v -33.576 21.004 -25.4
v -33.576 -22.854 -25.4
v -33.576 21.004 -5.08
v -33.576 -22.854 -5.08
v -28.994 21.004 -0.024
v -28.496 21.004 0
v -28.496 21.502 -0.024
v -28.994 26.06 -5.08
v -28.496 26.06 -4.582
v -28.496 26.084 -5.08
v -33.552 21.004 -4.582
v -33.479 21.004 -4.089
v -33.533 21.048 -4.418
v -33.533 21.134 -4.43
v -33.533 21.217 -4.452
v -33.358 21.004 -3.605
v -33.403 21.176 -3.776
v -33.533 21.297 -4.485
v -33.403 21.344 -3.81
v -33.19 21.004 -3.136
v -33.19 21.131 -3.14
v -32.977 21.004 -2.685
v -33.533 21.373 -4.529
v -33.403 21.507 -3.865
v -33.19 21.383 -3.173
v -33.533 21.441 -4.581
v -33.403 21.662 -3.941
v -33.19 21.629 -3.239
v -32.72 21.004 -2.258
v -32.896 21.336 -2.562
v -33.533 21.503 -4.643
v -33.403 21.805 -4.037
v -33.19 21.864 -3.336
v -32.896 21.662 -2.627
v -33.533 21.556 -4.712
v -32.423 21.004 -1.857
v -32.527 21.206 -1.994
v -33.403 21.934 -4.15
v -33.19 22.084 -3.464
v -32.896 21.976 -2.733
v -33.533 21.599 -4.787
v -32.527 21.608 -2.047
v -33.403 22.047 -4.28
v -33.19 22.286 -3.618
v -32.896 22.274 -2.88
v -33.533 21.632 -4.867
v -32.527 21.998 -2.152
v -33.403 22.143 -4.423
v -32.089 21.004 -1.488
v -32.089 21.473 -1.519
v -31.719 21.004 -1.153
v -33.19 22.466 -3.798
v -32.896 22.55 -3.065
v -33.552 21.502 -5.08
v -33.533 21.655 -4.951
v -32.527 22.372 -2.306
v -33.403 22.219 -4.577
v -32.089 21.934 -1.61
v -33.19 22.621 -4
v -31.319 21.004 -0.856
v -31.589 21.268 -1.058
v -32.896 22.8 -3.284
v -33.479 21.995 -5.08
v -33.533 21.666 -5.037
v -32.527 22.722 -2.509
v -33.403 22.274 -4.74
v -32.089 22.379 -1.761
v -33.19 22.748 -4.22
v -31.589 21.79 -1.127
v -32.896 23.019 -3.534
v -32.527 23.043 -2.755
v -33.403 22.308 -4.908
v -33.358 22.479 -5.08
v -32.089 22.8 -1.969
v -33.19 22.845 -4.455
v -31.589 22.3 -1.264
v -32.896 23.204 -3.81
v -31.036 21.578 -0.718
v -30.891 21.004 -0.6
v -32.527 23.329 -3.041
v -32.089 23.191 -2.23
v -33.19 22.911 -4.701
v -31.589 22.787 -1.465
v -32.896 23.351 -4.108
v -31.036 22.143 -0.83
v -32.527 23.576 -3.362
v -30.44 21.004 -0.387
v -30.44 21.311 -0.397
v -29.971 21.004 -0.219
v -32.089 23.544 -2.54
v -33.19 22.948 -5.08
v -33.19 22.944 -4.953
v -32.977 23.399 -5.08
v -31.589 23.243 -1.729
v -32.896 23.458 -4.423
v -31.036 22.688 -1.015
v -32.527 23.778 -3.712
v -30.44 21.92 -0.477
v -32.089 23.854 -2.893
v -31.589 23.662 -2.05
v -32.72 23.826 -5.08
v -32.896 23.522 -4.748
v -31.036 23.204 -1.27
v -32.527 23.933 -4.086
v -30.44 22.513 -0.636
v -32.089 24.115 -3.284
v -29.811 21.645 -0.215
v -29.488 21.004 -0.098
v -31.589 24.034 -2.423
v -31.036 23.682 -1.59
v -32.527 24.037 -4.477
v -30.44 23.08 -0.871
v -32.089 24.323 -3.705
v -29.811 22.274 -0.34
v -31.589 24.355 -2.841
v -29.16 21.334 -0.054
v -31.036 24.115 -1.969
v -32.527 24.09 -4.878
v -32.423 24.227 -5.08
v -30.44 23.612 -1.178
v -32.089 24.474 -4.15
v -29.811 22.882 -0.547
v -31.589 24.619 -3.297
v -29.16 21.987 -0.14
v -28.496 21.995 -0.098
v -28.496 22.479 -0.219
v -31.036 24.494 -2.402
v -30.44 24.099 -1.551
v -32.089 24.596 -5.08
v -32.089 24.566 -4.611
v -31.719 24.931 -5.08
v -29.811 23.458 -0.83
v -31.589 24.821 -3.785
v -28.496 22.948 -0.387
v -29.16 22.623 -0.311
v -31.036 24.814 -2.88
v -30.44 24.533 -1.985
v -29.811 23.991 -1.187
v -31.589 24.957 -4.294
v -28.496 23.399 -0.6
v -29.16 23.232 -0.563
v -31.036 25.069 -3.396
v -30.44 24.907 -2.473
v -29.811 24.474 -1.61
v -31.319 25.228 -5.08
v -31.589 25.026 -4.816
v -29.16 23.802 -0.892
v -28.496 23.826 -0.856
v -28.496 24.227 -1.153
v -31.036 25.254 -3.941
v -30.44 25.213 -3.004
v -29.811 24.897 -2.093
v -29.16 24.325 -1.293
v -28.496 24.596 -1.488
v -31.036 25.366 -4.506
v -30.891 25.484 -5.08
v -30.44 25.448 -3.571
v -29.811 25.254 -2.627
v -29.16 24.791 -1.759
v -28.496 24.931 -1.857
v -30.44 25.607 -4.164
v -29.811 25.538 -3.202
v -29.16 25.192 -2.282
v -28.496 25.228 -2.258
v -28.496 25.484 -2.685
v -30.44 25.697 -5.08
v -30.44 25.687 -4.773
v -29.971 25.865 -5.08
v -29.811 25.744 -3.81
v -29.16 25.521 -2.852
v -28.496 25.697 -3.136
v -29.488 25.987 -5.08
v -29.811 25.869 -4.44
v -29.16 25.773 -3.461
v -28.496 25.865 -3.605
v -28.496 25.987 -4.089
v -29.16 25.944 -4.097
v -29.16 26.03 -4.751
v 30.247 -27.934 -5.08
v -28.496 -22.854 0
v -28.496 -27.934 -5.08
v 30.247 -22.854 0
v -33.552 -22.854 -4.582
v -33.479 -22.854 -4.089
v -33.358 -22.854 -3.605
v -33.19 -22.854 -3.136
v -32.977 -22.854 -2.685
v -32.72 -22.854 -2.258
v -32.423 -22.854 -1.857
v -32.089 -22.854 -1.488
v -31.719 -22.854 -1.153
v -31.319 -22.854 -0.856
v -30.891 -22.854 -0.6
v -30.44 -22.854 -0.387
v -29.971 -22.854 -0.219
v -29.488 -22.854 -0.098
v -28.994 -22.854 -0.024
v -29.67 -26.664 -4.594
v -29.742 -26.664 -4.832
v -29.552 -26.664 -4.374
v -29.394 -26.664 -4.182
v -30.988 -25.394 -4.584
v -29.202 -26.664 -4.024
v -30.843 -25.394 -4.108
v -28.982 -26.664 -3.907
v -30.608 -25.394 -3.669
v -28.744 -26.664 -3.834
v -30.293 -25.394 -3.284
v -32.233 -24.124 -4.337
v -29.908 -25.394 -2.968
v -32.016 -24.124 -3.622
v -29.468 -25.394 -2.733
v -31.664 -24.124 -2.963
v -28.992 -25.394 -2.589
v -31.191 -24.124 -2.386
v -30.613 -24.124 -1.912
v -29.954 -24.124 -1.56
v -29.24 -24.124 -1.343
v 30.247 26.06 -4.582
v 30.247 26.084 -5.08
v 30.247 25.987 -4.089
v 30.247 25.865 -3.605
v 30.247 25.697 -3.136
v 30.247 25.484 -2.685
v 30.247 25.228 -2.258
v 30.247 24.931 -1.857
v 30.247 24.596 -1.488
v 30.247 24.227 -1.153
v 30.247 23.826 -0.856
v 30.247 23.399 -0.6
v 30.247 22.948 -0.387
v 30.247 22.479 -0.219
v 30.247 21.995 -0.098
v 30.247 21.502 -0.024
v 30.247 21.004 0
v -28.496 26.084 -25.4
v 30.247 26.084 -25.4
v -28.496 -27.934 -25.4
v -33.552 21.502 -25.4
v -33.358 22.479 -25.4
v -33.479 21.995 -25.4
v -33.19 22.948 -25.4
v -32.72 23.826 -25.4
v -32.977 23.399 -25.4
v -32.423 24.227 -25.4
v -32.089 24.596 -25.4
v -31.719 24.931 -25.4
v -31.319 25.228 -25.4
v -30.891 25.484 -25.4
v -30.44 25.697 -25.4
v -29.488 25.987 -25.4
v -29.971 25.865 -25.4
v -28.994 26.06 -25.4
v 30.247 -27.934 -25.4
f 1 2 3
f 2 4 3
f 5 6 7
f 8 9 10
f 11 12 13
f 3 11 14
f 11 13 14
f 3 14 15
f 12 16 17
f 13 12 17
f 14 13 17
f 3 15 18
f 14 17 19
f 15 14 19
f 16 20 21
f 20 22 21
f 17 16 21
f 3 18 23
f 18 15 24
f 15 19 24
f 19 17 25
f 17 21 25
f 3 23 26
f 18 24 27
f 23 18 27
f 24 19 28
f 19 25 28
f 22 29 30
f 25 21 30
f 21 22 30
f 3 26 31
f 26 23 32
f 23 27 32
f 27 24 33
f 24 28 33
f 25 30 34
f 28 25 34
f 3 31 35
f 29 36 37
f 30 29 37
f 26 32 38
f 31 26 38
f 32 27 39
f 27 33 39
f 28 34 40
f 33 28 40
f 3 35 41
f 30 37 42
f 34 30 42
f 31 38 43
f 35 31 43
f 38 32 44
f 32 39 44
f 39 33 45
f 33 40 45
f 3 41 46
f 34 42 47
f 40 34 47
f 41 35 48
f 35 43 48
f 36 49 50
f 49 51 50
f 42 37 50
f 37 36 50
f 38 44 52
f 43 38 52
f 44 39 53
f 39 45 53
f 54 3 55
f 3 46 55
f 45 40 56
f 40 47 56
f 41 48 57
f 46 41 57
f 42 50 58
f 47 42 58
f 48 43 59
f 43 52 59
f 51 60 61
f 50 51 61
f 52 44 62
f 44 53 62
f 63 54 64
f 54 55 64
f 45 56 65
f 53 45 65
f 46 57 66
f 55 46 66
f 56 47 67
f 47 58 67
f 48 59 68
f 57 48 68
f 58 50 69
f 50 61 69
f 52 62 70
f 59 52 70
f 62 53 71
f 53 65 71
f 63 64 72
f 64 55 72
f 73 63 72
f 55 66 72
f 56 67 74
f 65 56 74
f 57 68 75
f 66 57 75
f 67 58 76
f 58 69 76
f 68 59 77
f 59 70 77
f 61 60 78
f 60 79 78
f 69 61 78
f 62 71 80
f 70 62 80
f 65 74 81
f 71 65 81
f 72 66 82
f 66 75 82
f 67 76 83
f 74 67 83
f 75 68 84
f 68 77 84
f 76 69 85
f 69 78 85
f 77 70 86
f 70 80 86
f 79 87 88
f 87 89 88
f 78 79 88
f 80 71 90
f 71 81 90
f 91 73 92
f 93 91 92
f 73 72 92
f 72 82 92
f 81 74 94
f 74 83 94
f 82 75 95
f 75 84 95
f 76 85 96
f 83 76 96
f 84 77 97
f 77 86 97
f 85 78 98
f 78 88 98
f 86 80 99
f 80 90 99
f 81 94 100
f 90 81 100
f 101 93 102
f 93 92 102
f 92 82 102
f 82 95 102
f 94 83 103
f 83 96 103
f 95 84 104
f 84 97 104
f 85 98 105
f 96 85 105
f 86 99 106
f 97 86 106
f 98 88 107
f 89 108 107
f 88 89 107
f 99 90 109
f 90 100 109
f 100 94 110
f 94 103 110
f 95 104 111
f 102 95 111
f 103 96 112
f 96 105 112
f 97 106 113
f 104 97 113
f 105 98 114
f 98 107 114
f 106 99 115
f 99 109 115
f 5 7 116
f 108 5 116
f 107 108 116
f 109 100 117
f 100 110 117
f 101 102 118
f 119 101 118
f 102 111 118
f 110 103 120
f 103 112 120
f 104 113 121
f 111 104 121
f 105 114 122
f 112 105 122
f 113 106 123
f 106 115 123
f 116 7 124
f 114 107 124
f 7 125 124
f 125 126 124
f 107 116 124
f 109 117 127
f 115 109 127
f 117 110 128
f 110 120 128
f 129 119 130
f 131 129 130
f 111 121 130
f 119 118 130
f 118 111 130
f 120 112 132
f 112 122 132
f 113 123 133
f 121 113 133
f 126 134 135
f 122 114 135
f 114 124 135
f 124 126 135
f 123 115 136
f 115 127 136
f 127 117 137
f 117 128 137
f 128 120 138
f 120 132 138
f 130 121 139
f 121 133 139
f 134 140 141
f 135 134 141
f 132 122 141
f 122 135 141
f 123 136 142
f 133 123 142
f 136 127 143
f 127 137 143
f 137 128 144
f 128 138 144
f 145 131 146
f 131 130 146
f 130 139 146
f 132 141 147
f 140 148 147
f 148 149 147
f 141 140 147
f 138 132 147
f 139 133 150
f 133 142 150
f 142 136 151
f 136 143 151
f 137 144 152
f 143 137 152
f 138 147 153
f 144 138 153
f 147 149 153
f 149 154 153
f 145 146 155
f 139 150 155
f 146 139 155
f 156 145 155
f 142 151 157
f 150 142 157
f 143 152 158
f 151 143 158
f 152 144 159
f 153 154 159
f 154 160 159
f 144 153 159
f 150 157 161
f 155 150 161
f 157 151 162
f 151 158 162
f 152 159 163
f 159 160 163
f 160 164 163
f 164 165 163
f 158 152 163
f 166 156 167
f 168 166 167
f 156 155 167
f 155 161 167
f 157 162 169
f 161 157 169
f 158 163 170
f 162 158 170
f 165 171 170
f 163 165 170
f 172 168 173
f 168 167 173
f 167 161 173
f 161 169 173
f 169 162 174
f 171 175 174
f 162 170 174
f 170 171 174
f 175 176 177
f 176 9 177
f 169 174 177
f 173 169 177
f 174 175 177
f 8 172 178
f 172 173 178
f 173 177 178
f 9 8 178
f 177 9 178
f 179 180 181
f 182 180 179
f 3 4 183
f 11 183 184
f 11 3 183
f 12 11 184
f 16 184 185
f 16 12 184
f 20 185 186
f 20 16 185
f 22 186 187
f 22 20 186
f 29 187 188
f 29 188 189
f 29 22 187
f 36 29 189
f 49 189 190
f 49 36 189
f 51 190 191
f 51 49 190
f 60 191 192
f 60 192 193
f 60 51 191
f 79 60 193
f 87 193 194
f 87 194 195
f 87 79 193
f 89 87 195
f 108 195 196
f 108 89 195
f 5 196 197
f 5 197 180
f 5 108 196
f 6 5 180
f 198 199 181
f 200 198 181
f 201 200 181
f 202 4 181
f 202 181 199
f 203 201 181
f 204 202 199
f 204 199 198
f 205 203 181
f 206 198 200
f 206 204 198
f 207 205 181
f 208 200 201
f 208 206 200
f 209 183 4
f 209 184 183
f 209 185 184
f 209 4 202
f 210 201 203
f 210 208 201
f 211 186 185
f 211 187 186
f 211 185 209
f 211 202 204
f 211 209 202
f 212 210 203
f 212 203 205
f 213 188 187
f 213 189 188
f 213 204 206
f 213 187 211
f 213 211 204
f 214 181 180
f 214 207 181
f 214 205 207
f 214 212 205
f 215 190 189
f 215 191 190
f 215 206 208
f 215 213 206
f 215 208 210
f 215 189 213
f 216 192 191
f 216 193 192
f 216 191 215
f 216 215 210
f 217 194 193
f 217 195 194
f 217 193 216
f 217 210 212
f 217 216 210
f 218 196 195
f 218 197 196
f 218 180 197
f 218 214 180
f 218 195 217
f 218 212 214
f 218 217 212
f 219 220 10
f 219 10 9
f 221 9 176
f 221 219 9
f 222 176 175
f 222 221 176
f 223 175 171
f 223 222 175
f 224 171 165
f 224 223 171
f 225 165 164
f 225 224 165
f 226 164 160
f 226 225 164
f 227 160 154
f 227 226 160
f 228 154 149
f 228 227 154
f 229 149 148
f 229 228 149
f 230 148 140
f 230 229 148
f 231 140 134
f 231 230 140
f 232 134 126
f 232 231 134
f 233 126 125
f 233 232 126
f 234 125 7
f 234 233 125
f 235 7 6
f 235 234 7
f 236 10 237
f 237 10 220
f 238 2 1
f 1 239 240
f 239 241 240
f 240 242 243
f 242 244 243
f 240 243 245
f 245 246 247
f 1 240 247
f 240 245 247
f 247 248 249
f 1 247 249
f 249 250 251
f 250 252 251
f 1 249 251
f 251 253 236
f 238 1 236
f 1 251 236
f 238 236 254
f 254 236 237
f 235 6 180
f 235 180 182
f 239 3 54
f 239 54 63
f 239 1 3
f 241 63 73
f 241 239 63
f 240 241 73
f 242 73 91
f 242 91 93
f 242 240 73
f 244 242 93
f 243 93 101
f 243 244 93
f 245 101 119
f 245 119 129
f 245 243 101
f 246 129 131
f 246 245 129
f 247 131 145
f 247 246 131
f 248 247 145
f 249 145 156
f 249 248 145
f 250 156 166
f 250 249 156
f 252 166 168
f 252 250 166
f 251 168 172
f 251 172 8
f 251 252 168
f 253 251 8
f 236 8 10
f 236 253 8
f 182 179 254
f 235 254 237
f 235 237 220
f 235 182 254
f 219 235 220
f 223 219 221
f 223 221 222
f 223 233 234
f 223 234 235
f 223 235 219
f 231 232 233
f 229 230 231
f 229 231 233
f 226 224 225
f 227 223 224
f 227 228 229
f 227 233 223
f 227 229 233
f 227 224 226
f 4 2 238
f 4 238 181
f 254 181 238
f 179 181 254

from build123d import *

# Parameters (mm, degrees)
F0_W     = 63.8230051845
F0_H     = 54.0183149278
F1_DEPTH = 25.4
F2_R     = 5.08
F3_R     = 5.08
F4_SIZE  = 5.07999


# Not quite as in the source:
# - a fillet or chamfer is up to 0.001 mm smaller than in the source, because OpenCascade refuses the exact size


with BuildPart() as f1:
    # F0 (on Top) → F1 (new body)
    with BuildSketch(Plane.XY):
        with Locations((-1.6649486497, -0.9249709547)):
            Rectangle(F0_W, F0_H)
    extrude(amount=-F1_DEPTH)

    # F2
    f2_edges = [f1.edges().sort_by_distance(p)[0] for p in [
        (-1.664949, 26.084187, 0),
    ]]
    fillet(f2_edges, radius=F2_R)

    # F3
    f3_edges = [f1.edges().sort_by_distance(p)[0] for p in [
        (-33.576451, -3.464971, 0),
    ]]
    fillet(f3_edges, radius=F3_R)

    # F4 (size 5.08 in the source; OpenCascade refuses exactly that, so slightly less here)
    f4_edges = [f1.edges().sort_by_distance(p)[0] for p in [
        (0.875051, -27.934128, 0),
    ]]
    chamfer(f4_edges, length=F4_SIZE)


solid = f1.part
